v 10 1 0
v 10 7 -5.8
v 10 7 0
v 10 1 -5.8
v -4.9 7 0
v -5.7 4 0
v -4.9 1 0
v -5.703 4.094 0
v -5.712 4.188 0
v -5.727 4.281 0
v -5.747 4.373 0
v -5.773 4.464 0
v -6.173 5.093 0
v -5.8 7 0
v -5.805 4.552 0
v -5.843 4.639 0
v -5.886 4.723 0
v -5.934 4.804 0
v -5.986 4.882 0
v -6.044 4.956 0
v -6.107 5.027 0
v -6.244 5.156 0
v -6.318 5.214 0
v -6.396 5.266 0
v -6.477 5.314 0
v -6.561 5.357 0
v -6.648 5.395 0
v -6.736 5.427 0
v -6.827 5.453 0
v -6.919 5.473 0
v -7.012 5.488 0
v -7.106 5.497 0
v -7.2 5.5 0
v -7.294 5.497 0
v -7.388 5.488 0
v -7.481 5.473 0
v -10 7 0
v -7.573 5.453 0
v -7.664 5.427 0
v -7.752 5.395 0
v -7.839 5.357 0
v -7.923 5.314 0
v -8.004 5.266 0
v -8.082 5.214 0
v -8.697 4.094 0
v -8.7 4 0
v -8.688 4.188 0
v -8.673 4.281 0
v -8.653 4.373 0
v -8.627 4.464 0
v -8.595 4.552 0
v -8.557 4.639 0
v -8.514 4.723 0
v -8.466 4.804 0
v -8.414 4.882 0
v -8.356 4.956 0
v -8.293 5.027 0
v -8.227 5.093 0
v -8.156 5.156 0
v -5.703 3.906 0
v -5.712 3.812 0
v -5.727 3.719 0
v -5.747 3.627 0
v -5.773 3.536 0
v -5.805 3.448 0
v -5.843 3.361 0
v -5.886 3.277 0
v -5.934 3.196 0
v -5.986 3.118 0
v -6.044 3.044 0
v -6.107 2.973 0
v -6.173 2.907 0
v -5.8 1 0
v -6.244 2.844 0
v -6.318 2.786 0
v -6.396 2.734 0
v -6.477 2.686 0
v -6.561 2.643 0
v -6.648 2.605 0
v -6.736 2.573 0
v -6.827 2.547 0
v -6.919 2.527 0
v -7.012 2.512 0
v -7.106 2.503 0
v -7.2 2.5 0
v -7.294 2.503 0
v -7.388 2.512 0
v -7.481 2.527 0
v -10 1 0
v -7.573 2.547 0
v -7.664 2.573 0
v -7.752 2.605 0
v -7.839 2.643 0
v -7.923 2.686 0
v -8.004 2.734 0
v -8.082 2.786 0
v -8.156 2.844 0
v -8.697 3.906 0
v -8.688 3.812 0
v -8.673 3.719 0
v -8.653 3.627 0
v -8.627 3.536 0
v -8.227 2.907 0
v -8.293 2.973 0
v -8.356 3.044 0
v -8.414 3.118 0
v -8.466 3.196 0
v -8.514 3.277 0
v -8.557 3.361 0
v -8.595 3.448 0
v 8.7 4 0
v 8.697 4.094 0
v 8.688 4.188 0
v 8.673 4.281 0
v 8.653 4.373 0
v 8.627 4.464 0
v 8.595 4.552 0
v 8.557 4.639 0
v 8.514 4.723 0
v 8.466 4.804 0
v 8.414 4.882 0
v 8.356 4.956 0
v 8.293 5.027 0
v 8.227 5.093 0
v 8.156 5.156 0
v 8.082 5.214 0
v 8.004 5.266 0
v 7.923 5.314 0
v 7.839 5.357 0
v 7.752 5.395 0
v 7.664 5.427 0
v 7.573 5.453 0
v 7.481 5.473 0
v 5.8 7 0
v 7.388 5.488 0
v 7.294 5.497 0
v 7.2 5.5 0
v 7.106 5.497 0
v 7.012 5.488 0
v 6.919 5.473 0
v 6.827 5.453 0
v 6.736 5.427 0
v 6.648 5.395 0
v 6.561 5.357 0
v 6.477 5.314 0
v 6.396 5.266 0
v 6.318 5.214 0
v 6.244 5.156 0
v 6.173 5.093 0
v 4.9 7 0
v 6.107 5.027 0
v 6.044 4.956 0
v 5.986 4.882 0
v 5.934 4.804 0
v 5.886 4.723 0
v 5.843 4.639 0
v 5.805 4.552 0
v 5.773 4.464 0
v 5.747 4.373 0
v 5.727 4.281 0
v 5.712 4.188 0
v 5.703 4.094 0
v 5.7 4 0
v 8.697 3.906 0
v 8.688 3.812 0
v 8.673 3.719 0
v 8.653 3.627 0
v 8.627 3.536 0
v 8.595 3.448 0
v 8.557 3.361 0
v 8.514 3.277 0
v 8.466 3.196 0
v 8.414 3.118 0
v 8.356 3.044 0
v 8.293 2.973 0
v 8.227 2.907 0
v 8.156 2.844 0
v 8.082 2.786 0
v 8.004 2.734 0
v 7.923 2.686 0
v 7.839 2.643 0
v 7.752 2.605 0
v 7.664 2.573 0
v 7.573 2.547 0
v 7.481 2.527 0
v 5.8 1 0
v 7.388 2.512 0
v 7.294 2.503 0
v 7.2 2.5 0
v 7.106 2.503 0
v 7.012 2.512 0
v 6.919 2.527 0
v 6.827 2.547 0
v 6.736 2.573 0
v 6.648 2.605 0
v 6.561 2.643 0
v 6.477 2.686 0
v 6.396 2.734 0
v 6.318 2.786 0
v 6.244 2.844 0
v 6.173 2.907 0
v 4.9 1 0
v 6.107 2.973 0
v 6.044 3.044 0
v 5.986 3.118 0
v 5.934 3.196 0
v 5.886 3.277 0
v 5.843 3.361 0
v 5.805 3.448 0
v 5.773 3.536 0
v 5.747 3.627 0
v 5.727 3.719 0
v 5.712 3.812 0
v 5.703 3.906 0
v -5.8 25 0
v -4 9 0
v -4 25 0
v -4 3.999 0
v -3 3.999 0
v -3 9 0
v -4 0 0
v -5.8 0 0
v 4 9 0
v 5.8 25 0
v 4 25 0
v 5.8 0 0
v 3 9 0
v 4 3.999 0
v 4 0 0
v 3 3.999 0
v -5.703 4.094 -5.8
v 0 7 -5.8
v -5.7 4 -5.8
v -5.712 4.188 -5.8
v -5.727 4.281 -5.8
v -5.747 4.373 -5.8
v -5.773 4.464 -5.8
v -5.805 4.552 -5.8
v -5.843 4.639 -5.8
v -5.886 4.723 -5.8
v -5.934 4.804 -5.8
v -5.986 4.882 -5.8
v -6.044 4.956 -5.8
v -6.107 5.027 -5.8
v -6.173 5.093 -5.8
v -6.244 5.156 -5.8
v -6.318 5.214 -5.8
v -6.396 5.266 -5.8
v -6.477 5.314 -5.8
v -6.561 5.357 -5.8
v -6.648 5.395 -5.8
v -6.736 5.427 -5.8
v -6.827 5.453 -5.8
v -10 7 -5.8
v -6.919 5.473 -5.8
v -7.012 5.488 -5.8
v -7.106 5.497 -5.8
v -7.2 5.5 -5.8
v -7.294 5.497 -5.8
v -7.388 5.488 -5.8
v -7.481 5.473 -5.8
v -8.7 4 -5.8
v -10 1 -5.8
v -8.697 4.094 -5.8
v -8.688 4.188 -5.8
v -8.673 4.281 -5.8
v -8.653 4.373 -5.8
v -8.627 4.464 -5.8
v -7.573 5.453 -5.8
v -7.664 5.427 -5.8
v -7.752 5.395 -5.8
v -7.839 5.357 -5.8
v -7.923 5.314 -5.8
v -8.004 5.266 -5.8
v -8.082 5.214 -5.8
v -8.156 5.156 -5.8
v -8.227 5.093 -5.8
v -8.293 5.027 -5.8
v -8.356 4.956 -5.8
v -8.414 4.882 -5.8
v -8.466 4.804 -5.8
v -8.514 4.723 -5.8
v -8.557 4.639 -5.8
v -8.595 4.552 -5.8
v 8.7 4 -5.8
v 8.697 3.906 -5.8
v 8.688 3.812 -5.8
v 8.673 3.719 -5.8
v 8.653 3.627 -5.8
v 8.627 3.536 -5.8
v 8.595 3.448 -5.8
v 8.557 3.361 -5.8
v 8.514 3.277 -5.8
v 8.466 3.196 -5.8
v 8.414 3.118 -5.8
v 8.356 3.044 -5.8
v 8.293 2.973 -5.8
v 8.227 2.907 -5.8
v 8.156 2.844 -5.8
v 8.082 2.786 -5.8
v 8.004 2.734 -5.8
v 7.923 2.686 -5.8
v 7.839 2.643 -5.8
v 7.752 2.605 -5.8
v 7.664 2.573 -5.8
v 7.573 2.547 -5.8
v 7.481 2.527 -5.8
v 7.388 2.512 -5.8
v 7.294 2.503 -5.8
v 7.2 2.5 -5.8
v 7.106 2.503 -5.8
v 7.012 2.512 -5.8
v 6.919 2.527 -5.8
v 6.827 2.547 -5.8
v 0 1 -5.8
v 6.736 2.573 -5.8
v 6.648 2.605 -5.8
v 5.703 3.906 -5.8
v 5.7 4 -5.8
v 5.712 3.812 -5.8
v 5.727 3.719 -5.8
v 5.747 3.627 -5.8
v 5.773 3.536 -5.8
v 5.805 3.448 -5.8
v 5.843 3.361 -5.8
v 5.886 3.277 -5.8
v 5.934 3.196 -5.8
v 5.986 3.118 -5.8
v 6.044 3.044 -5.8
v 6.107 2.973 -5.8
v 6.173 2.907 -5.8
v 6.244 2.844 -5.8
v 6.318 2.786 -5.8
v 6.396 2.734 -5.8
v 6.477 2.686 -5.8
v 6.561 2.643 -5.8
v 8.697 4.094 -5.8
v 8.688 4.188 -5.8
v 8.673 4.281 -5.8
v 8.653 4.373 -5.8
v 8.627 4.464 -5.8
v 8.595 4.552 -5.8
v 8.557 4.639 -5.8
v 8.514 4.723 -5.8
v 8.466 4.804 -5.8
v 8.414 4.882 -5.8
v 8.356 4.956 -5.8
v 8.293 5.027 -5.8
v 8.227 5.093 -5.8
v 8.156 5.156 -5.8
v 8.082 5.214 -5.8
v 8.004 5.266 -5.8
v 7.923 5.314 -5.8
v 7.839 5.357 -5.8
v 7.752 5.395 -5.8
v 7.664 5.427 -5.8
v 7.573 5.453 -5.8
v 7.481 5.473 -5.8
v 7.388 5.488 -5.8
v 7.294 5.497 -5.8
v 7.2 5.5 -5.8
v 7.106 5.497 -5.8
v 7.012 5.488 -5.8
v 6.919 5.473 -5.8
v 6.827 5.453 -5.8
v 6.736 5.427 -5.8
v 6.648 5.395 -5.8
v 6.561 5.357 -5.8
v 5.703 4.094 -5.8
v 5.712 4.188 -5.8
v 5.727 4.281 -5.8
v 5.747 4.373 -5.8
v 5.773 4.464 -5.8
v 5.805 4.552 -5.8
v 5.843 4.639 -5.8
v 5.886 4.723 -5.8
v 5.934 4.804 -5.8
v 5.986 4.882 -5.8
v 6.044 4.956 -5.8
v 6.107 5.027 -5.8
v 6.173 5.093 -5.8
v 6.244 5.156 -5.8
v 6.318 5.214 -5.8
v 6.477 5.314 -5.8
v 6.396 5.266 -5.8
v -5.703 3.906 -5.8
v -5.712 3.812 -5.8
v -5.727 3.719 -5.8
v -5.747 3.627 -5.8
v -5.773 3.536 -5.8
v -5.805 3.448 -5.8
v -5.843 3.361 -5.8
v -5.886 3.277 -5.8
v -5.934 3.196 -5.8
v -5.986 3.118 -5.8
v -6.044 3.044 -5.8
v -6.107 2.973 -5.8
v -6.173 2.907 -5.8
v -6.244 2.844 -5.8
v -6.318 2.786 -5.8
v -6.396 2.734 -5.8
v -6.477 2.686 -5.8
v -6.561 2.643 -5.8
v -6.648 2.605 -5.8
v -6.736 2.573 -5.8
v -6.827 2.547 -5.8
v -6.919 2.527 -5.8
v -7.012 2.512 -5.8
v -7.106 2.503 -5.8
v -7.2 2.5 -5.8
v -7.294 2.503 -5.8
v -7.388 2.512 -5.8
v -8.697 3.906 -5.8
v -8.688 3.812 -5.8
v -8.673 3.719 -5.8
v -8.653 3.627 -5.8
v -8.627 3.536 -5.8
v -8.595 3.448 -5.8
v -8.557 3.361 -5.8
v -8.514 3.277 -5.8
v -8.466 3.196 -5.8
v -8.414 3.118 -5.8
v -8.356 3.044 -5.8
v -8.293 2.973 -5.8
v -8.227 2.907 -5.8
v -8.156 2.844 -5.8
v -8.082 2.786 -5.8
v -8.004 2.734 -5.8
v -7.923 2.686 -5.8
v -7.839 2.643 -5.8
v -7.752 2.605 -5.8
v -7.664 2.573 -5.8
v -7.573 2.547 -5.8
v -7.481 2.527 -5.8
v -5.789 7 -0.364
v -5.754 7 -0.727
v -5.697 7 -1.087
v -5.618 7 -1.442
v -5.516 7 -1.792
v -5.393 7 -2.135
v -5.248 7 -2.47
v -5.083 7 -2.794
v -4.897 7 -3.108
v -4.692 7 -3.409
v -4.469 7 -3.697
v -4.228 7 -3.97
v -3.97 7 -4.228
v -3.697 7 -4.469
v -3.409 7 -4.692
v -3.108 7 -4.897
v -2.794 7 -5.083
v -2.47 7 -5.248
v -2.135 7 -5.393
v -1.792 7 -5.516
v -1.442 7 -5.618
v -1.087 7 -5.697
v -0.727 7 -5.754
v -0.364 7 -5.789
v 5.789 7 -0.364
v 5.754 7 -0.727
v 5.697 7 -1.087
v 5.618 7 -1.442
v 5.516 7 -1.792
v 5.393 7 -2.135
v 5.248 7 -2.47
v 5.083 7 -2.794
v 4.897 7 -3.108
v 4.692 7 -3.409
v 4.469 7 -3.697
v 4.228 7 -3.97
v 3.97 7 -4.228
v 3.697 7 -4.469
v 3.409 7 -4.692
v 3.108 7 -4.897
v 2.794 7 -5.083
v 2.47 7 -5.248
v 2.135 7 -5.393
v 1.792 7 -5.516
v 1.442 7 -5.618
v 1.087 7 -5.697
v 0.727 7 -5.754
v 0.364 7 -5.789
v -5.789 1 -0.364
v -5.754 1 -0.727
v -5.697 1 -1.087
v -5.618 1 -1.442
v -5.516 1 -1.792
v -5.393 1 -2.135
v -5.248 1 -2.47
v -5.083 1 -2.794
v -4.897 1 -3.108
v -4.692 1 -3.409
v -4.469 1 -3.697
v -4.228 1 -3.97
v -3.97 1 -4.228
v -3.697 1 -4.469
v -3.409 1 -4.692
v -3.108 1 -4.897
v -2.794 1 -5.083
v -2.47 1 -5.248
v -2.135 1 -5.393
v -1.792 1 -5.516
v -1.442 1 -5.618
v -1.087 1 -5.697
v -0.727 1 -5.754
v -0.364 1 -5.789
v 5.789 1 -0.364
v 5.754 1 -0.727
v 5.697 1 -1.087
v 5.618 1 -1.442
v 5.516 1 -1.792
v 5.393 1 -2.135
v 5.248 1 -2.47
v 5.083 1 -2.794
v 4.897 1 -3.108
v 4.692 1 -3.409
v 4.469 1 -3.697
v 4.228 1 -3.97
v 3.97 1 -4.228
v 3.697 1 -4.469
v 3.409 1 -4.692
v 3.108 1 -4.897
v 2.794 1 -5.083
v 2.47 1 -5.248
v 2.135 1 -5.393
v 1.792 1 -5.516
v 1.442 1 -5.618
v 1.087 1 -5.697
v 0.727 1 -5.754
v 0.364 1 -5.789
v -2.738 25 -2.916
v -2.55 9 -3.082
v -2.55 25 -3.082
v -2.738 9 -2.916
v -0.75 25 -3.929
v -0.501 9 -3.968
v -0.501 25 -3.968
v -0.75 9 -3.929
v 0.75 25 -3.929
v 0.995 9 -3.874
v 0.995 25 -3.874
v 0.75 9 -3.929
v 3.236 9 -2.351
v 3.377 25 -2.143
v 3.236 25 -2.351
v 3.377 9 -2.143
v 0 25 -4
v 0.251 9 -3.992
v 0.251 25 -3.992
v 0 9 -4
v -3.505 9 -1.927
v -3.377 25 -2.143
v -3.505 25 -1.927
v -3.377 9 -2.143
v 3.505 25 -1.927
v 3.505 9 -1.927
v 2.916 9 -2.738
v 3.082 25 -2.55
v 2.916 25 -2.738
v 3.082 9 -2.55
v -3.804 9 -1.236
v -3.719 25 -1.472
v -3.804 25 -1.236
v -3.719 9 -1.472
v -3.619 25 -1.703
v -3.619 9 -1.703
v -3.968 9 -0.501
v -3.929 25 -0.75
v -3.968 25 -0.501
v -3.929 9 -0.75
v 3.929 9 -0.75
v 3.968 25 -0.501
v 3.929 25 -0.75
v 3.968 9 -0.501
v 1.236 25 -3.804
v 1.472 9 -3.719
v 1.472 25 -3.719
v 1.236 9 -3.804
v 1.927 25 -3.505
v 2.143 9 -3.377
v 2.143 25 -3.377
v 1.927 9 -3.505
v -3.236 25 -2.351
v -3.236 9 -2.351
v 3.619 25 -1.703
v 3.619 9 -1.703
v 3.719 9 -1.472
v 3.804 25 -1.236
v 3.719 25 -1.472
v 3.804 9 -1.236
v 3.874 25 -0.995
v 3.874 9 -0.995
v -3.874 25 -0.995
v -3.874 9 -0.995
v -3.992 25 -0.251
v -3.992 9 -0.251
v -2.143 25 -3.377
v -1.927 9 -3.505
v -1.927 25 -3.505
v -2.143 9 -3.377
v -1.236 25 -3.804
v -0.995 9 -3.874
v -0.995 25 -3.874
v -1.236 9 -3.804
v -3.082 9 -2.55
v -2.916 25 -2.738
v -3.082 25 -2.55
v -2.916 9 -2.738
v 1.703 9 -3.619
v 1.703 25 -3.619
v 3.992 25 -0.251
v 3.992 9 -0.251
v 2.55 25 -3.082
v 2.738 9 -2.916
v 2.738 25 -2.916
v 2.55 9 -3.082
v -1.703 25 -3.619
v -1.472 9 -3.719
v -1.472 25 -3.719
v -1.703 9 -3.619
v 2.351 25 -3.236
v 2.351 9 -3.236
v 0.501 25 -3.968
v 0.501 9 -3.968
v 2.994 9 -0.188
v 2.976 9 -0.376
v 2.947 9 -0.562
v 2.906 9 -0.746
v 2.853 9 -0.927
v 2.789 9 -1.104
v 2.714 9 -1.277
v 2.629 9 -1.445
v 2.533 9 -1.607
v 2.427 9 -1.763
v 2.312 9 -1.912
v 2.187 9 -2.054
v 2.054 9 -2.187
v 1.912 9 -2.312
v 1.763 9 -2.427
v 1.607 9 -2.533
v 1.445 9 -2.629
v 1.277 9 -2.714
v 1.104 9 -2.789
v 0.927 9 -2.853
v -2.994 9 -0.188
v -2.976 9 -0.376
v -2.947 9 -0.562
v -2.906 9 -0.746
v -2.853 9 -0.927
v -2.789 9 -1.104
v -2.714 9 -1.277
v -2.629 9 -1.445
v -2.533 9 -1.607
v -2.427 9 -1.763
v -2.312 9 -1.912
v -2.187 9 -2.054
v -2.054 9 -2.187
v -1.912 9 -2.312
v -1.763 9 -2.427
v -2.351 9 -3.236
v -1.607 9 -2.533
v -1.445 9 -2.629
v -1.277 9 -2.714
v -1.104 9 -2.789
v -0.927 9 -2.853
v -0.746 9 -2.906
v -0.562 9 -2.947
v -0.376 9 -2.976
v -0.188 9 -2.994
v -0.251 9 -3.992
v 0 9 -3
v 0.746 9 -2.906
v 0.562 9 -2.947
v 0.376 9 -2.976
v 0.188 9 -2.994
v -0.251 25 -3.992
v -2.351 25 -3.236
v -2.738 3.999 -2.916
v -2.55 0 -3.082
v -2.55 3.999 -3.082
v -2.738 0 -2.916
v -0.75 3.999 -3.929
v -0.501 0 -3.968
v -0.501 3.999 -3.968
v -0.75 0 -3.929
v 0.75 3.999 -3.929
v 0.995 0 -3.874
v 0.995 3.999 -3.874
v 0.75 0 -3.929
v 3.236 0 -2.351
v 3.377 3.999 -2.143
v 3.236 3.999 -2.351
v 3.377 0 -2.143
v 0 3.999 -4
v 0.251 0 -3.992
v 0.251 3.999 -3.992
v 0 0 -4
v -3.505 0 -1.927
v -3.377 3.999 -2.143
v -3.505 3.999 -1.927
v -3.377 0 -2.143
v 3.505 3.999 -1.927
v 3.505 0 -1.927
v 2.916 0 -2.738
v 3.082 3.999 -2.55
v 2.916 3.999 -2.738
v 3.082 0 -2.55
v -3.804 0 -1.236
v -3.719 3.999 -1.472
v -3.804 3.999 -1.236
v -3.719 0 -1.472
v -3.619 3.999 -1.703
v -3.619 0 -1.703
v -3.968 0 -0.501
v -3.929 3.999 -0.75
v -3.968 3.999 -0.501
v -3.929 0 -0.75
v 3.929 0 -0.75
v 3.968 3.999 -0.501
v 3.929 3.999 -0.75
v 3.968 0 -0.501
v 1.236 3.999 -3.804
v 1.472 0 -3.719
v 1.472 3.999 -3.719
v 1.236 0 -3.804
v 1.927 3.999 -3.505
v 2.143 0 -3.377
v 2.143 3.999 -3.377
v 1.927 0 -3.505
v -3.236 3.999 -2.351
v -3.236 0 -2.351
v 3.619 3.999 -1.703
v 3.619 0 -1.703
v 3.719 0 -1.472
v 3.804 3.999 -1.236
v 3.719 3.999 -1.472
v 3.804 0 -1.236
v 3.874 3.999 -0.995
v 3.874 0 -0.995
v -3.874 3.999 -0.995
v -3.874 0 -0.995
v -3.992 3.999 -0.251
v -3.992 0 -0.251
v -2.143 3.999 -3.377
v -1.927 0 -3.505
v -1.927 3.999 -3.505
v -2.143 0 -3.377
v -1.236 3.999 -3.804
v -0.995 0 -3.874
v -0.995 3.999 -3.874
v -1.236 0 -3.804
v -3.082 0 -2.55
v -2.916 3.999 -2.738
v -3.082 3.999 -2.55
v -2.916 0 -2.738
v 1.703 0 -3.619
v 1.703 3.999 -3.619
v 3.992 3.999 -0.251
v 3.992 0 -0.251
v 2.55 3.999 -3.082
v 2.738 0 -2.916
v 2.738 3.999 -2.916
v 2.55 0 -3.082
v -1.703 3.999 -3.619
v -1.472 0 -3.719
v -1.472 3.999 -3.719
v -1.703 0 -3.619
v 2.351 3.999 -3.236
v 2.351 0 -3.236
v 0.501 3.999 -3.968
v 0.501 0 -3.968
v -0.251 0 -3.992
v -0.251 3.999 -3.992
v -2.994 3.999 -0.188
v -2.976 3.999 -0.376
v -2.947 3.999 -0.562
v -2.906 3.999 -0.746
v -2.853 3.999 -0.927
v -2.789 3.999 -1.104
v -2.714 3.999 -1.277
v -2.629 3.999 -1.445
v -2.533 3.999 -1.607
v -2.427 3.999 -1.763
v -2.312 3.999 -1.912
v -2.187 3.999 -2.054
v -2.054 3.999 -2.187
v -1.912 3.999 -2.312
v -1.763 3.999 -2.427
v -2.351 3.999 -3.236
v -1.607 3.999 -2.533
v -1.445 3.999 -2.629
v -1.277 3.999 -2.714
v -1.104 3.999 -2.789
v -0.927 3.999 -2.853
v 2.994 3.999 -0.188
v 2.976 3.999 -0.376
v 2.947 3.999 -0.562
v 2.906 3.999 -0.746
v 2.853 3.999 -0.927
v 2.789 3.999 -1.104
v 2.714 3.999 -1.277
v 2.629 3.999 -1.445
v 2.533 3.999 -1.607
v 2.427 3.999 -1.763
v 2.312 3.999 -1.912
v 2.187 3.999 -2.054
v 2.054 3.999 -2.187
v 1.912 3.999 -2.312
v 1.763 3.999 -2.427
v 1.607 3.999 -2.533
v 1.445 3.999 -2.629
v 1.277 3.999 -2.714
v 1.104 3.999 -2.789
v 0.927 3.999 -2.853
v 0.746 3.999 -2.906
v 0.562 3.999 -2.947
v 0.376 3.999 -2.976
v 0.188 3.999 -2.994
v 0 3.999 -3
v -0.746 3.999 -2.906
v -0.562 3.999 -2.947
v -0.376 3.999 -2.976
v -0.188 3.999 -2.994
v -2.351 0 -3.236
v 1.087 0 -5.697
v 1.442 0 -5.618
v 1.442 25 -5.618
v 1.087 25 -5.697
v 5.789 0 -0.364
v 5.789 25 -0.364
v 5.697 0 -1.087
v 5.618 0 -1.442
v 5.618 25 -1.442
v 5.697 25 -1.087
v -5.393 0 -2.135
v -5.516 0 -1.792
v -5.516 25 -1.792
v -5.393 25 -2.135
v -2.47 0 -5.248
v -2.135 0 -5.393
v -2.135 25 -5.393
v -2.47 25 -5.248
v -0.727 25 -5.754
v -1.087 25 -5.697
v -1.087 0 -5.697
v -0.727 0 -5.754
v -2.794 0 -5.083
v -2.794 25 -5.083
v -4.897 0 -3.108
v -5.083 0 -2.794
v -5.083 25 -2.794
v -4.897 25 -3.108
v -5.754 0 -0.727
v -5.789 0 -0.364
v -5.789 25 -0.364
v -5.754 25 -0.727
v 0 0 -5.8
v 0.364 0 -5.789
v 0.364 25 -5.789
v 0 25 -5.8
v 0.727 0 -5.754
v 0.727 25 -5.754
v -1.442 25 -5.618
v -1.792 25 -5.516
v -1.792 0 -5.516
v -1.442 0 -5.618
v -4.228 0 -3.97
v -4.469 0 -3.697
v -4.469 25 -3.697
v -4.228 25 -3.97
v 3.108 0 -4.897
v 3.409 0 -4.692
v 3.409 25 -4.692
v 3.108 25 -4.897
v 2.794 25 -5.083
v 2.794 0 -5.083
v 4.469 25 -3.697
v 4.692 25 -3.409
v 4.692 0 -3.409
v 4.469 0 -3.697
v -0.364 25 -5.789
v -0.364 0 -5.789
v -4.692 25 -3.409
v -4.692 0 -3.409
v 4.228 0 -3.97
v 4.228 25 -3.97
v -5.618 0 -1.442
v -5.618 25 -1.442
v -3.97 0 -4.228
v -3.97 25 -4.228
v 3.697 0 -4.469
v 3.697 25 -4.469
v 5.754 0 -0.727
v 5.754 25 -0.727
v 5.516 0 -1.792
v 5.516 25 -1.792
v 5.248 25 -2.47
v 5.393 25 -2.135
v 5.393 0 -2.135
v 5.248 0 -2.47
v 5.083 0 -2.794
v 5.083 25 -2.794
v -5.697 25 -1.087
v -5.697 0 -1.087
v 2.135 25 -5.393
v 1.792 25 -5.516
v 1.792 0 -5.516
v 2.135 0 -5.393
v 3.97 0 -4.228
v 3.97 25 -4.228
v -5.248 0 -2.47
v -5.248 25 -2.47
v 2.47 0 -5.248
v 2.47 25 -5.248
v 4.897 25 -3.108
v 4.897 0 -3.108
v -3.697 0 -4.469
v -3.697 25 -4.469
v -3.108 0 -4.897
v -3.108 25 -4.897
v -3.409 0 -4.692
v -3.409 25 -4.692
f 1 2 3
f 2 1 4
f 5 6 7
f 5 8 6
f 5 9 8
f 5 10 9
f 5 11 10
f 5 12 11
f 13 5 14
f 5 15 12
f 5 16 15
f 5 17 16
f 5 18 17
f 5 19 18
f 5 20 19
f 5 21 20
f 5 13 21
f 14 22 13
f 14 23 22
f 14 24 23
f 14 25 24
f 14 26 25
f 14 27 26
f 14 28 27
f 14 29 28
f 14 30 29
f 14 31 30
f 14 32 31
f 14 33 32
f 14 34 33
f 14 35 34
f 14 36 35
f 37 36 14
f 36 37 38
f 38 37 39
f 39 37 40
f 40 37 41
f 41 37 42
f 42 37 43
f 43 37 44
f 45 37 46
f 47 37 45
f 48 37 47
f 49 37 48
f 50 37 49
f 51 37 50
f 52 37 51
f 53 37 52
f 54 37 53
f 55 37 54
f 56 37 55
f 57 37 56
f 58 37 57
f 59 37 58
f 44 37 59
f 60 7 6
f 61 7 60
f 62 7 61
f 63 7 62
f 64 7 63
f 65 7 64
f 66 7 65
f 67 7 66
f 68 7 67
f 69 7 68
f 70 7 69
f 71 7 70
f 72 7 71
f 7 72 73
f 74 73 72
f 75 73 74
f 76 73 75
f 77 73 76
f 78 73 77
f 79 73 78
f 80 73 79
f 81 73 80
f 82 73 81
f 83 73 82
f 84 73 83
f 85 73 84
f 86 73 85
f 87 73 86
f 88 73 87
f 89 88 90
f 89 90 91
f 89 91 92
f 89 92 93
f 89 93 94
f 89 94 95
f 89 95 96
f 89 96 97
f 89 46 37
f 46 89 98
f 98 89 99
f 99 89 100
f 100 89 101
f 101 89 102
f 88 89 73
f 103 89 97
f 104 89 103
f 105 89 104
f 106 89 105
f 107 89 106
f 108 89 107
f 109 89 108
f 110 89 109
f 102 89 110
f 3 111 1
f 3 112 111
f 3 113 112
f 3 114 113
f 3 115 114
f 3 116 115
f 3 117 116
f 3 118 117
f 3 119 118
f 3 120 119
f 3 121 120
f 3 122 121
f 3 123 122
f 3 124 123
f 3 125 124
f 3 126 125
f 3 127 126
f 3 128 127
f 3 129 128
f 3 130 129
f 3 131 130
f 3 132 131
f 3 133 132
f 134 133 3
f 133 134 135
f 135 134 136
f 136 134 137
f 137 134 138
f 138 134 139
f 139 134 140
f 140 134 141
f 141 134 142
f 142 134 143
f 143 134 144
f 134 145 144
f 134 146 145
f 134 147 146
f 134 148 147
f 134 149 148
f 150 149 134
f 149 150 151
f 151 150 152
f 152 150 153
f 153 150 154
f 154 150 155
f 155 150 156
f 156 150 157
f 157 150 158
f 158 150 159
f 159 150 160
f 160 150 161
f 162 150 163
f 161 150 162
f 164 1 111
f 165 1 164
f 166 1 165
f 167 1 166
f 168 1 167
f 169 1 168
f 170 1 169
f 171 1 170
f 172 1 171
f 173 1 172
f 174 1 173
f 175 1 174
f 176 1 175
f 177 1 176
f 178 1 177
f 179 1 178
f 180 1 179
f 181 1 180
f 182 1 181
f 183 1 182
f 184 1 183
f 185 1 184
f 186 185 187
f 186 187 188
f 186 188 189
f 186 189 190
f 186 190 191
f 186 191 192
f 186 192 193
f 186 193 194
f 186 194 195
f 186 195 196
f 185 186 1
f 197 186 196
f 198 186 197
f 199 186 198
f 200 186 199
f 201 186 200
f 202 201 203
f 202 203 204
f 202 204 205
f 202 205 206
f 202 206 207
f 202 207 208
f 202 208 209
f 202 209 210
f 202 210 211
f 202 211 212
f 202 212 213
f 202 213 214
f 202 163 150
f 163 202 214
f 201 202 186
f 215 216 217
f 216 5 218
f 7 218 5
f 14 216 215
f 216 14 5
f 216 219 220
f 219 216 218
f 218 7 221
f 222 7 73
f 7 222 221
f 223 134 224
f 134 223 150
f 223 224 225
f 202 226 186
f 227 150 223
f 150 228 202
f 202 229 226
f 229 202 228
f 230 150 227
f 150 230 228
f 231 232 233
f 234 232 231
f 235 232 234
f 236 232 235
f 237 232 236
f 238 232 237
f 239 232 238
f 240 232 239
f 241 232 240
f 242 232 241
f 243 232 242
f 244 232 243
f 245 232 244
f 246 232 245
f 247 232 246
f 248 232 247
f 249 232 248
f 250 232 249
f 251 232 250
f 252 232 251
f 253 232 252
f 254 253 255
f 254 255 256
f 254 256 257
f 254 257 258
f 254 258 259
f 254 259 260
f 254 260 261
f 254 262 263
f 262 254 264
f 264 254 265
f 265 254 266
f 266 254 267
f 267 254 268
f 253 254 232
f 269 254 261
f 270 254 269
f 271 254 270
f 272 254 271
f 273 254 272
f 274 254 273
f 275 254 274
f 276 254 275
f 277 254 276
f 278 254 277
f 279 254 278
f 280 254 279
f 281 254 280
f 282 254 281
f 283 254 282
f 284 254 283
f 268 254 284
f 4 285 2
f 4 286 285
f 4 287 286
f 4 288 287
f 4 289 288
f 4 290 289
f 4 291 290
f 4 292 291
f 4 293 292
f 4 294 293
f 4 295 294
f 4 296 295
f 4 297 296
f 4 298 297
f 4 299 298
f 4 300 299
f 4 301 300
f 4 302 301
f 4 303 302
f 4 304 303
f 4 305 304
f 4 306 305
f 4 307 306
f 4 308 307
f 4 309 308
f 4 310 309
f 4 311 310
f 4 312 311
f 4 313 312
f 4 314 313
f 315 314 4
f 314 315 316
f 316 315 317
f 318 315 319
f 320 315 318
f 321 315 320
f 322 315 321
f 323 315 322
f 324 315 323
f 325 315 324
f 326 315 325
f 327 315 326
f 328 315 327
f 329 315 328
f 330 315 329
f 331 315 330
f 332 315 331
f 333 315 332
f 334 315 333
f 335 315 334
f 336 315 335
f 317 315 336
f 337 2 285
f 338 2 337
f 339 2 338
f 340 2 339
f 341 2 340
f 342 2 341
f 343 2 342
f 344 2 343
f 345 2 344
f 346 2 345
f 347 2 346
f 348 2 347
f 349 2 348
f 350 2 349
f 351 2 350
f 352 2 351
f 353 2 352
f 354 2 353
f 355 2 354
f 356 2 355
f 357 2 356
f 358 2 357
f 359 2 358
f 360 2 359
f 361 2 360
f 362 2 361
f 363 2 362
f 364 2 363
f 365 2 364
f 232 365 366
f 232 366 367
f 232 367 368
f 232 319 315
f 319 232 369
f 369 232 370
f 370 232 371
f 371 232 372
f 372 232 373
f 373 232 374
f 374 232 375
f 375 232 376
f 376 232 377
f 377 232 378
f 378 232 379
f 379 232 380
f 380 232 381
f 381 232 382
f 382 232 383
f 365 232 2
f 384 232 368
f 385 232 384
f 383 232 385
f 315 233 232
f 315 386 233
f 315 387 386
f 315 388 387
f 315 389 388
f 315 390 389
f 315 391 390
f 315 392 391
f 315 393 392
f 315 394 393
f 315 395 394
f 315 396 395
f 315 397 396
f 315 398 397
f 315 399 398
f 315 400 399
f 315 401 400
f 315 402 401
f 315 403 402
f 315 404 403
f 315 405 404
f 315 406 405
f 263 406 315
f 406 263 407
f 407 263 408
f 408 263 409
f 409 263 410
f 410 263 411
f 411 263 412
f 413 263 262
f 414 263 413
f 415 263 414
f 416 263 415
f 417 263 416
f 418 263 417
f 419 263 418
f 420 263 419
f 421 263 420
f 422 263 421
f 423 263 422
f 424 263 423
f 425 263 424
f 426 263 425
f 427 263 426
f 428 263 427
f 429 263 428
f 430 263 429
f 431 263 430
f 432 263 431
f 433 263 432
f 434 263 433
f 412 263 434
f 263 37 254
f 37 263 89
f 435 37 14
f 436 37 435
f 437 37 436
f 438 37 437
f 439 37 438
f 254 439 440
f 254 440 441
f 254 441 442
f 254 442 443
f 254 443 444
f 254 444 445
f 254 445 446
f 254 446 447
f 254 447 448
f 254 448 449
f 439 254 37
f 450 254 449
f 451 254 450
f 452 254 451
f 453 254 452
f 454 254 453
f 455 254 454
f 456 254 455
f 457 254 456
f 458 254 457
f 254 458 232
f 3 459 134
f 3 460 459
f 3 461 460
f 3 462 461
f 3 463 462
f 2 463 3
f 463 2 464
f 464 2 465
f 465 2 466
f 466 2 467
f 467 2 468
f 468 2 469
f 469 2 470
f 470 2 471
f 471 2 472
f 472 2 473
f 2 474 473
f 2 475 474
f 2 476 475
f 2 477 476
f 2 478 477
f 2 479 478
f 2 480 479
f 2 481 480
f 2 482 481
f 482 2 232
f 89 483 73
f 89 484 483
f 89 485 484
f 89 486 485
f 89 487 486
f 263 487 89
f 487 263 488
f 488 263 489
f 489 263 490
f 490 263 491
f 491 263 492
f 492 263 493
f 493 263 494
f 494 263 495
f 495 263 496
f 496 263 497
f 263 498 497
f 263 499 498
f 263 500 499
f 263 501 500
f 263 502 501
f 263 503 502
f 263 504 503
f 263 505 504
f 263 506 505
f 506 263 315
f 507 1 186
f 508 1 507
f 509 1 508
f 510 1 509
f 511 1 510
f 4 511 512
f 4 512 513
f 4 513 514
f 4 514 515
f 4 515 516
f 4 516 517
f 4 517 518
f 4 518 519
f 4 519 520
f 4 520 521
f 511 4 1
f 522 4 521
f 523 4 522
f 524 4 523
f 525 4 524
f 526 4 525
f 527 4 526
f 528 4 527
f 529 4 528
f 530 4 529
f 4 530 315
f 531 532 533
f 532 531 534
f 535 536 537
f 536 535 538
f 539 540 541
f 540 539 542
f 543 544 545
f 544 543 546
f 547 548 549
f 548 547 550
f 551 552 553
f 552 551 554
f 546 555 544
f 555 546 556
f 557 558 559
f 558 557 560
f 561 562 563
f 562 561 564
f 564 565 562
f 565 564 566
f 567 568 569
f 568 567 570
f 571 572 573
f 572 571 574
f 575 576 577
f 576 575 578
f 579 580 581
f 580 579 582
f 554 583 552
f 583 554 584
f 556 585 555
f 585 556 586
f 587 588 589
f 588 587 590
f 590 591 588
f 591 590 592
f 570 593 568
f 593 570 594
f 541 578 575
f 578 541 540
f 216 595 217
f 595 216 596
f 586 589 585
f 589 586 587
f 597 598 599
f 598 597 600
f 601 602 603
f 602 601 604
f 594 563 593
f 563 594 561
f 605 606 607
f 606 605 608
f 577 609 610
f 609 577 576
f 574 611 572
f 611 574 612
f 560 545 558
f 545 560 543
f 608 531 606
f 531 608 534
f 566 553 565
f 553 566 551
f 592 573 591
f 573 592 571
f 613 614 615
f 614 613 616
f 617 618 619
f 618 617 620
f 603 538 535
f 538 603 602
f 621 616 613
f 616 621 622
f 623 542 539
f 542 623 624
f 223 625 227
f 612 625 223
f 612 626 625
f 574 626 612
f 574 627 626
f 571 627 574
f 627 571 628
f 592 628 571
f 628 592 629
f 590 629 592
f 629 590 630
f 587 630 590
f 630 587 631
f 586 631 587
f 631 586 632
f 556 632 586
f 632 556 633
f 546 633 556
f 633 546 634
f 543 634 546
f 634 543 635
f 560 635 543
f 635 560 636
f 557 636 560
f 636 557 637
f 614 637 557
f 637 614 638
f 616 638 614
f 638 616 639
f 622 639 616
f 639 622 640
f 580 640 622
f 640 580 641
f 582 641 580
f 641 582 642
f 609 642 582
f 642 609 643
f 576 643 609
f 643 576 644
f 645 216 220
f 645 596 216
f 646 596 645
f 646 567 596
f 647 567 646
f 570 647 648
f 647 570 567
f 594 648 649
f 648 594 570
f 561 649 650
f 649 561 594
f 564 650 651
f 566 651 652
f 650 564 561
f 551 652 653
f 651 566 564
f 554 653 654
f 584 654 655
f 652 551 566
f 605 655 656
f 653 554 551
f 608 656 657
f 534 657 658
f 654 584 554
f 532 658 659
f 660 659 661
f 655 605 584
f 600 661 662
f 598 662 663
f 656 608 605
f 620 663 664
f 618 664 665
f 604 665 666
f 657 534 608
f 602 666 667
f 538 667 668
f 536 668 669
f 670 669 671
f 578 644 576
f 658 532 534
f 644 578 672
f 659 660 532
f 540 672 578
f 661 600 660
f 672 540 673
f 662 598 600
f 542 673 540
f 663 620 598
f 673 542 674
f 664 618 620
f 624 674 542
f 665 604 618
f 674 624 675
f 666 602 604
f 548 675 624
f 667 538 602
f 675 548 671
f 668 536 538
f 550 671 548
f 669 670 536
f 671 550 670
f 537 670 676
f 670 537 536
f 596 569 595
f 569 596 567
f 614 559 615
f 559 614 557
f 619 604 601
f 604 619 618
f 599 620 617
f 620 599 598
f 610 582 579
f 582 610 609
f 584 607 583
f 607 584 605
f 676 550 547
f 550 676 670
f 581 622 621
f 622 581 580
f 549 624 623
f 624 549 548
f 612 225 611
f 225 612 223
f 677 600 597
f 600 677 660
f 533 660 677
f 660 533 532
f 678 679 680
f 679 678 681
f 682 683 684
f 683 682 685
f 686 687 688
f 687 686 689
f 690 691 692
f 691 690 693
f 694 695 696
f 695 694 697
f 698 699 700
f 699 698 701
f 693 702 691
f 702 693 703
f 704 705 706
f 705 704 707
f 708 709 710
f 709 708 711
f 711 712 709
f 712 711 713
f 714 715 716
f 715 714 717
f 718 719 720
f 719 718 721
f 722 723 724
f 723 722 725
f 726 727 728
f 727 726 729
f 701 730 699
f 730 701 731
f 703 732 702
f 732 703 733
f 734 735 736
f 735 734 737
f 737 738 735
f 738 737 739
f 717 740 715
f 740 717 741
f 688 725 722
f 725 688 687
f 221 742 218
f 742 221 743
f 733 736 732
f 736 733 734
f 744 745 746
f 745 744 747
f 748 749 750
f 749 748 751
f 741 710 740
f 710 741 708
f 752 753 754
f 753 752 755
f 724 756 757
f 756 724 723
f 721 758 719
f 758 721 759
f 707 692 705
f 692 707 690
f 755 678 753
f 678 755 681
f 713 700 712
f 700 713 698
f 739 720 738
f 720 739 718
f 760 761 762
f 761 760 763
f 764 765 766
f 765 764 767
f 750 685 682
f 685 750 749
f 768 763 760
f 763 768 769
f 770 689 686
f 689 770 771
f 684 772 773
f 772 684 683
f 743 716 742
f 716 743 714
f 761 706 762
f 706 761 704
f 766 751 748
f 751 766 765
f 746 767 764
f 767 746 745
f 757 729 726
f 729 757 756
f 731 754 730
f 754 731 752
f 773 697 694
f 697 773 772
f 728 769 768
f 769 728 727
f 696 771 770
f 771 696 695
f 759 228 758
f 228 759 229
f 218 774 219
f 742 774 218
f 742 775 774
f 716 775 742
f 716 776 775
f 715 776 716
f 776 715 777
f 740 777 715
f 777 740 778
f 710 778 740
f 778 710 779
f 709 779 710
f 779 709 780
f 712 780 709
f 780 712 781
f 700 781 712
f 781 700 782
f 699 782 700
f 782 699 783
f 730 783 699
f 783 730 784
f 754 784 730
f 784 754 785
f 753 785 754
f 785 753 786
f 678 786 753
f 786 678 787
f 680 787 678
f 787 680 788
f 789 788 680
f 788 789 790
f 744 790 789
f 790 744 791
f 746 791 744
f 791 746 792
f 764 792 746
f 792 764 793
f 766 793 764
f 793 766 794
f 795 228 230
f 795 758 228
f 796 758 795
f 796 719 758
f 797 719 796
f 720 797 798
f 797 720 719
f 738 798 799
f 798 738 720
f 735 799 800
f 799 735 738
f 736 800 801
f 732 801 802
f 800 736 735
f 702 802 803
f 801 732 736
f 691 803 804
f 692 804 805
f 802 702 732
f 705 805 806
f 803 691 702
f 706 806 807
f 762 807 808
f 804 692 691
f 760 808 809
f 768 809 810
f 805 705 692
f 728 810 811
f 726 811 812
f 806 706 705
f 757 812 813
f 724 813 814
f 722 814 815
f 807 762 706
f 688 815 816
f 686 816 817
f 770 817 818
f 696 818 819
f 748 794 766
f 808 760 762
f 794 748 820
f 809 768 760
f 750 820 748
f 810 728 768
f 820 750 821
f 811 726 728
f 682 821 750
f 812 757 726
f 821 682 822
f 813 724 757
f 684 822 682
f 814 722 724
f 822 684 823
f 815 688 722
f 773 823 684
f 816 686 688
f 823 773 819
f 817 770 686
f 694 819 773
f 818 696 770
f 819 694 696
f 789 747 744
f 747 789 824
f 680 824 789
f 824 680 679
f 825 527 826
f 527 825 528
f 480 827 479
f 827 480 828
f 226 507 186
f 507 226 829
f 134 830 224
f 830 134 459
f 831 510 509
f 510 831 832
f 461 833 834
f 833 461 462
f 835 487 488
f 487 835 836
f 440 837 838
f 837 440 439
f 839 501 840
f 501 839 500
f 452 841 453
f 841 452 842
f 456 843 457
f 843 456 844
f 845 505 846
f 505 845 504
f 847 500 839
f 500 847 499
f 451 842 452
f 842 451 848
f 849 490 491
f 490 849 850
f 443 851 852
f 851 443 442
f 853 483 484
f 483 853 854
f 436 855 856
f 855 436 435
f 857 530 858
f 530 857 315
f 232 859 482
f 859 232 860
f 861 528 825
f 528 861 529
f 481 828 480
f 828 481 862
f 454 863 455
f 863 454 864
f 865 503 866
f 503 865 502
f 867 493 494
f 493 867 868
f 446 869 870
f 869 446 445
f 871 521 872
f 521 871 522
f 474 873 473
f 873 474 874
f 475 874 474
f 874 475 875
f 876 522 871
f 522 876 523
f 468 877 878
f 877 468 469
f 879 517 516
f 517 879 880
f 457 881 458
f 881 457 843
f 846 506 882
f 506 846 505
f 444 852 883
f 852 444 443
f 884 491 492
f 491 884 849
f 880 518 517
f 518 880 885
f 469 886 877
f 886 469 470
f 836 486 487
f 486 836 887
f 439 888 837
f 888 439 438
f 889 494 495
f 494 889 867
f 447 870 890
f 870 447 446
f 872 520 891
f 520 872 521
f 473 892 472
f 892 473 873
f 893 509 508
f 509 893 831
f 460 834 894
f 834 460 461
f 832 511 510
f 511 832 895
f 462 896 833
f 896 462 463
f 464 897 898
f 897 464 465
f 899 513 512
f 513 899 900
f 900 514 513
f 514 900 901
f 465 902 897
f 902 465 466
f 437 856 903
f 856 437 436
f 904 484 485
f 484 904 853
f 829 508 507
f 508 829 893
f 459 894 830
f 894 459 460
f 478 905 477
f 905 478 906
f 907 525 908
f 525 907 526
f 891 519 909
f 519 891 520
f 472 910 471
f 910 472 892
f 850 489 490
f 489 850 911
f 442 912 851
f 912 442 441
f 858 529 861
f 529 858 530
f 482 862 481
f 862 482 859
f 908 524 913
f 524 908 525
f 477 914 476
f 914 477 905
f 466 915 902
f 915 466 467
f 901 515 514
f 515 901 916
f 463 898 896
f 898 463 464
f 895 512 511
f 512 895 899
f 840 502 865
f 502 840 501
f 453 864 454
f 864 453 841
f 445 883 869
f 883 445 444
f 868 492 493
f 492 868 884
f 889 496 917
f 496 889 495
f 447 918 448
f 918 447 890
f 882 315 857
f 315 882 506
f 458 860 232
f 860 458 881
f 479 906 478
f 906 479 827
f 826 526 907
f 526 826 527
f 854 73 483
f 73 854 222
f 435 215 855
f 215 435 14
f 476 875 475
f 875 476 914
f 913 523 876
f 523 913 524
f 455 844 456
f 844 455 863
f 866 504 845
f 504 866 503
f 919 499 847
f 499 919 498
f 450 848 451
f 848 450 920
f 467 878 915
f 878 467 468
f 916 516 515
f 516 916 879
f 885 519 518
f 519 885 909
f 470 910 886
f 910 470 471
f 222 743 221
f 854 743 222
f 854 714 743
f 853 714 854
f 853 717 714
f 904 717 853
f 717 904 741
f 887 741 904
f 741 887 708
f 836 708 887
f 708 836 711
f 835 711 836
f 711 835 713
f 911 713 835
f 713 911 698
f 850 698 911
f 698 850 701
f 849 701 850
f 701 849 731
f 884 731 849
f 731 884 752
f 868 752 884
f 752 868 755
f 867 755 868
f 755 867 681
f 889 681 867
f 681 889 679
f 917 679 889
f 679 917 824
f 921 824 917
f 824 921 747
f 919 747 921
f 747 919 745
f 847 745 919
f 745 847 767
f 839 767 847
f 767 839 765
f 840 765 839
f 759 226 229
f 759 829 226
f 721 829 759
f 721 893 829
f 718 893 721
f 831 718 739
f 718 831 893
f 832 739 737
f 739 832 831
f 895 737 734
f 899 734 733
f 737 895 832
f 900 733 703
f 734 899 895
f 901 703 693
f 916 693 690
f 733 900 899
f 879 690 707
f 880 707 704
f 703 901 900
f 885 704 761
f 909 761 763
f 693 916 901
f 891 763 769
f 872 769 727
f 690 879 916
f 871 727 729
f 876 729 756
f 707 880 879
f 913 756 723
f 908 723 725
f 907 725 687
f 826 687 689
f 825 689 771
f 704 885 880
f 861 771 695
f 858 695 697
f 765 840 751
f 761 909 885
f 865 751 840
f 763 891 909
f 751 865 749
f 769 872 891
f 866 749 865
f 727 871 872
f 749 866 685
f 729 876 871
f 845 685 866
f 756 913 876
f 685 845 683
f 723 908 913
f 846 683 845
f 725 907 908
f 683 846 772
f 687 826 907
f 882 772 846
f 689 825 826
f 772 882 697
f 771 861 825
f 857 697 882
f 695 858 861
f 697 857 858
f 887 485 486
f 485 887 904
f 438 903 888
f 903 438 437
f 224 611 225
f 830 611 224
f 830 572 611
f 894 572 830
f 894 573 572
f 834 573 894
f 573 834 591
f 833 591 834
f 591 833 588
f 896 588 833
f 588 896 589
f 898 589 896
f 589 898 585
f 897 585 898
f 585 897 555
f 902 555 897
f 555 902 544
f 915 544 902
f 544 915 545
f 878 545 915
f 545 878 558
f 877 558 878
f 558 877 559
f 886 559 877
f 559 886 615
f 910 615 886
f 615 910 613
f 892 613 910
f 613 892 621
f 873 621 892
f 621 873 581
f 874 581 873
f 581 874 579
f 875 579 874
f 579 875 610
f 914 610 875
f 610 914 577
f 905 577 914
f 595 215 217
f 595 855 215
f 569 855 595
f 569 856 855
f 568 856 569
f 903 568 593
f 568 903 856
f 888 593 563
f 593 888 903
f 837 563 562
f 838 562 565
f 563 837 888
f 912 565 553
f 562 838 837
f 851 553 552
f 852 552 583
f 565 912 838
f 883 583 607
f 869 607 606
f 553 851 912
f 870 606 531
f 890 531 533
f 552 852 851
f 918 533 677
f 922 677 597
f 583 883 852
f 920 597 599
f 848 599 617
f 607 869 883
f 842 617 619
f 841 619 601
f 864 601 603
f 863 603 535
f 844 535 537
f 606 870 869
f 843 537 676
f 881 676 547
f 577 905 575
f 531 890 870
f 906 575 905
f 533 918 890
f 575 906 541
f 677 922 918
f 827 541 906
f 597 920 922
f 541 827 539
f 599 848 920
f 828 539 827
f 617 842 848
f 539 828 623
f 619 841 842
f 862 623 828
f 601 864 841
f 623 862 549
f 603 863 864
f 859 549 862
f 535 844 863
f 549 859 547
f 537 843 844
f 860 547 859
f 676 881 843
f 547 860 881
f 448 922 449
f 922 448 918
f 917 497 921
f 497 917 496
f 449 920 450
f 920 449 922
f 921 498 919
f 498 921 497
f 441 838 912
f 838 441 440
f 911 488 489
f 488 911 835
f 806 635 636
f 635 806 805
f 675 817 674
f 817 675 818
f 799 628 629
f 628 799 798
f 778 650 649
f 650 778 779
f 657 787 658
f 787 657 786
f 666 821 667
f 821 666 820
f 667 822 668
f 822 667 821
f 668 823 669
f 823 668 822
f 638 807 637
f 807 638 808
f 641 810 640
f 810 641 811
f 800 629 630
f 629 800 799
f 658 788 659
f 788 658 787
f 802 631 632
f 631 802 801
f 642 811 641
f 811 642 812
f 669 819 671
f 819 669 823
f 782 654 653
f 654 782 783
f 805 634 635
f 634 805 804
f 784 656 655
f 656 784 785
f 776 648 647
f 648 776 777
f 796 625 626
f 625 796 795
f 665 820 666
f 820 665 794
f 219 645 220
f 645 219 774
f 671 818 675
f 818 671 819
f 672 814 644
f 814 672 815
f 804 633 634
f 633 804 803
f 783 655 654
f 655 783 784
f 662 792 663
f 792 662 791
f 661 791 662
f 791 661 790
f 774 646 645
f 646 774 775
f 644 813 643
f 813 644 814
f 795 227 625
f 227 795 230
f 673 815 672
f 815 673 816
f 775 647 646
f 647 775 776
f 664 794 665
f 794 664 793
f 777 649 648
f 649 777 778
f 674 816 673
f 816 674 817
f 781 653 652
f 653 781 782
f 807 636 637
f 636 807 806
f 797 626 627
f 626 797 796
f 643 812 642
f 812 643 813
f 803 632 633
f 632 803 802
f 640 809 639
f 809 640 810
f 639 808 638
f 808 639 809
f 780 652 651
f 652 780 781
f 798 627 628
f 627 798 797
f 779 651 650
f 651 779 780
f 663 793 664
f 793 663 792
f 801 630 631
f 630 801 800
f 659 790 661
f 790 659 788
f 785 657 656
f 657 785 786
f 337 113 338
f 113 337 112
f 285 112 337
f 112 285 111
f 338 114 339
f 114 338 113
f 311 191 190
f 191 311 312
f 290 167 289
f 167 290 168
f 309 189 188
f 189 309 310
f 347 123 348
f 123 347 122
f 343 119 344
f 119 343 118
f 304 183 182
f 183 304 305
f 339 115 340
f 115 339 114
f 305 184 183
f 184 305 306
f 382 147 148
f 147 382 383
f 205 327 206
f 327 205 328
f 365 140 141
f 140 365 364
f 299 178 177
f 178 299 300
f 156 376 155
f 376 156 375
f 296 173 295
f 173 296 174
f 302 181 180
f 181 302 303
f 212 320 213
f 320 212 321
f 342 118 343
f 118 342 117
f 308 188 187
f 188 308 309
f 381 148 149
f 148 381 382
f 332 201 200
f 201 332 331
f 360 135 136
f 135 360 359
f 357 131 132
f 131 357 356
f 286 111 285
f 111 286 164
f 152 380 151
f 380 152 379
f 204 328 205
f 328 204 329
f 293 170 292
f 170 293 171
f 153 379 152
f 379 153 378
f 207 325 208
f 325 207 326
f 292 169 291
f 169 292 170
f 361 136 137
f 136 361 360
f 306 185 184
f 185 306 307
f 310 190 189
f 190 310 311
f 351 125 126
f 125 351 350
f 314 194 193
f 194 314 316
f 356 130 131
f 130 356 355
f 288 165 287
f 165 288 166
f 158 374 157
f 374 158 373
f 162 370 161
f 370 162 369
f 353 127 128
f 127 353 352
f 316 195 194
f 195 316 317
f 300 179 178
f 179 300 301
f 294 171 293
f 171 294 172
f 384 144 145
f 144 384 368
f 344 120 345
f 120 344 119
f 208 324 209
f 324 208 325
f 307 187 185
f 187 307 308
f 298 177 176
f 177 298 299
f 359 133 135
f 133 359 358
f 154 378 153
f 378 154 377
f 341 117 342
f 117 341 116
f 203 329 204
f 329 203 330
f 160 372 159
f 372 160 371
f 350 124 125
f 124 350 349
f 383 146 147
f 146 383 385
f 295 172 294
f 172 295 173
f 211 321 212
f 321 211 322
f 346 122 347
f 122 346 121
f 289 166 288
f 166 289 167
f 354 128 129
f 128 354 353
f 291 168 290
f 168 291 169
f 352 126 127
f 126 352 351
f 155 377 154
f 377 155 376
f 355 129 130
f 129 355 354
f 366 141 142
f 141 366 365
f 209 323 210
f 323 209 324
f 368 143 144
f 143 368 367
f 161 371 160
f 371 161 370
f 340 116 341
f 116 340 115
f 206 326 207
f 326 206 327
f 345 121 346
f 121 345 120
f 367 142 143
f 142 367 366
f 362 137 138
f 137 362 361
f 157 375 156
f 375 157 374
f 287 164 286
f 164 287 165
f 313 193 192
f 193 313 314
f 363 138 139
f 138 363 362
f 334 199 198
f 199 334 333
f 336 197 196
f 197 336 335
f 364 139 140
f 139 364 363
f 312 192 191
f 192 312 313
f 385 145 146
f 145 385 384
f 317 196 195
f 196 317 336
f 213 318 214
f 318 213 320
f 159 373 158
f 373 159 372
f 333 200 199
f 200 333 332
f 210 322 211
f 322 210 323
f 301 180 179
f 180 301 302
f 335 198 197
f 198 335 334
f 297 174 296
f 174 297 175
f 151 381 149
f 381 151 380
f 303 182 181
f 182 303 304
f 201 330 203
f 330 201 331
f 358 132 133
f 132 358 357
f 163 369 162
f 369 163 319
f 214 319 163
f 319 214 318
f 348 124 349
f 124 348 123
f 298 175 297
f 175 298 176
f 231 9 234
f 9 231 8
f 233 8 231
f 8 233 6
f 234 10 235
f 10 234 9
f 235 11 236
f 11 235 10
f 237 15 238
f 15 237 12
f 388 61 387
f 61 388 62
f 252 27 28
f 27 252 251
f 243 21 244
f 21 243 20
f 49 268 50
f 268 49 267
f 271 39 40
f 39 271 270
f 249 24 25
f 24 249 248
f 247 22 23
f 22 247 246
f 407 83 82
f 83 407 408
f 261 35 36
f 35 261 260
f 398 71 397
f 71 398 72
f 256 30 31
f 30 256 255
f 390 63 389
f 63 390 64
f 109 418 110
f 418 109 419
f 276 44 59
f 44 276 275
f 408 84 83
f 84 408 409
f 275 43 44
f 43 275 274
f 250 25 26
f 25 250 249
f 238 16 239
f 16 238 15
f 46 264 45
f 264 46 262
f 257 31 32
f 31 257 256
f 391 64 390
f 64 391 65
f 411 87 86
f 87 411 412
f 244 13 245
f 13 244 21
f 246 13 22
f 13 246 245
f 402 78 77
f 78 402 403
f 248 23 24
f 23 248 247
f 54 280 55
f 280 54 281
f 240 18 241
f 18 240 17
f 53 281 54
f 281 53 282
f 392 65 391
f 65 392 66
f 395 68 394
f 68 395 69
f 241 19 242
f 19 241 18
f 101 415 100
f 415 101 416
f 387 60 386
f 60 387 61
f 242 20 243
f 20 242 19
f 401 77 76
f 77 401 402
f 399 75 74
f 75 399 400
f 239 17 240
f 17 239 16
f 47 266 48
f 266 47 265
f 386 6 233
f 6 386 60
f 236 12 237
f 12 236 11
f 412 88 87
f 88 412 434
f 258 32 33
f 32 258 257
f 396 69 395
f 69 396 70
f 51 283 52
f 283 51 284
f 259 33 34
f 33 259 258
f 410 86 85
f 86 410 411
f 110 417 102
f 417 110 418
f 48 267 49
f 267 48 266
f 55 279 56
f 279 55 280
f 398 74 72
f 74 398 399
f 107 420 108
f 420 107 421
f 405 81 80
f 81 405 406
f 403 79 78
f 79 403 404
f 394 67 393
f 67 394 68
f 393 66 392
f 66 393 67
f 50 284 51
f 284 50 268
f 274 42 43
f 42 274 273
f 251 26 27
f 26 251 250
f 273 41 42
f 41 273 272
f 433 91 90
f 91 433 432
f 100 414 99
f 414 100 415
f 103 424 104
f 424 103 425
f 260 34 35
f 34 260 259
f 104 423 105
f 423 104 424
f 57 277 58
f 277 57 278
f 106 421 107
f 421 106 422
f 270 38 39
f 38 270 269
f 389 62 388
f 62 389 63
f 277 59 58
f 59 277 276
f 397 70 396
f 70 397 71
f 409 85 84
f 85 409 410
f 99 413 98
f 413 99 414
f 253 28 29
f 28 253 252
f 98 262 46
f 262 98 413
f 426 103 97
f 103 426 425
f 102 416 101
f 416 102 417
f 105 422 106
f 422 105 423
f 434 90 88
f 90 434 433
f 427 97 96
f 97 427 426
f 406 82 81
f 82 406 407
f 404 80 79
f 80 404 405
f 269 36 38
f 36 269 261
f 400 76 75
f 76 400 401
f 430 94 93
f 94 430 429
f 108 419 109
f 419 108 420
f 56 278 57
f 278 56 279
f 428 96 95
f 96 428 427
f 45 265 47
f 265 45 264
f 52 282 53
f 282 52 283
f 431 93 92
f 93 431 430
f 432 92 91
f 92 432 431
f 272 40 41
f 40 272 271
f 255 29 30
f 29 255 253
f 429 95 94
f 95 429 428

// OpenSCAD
$fn=100;

Daxis=8;//diametre axe
Dmin=6;//diametre dans l'encoche

Lroulement_encoche=16;//distance minimale entre le roulement et l'encoche
Lroulement_roue=18;//distance entre la fin du roulement et la partie exterieure de la poulie
Lencoche=5;//longueur de l'encoche

ep=1.8;//epaisseur du manchon

Dholes=3;//diametre des trous de fixation
Dflat=Dholes*2;//longueur plate a cote des trous

Lsq=25;//longueur de la piece

Wsq=18;

eps=0.001;

cutx=Wsq*2;
cuty=Lsq*4;
cutz=Daxis*2;

difference()//holes for screews
{

union(){//place for screews

translate([0,Lsq-Dflat-Lroulement_roue,0])
difference(){
translate([0,Dflat/2,-Daxis/4-ep/2])
cube(size=[Daxis*2.5,Dflat,Daxis/2+ep],center=true);

translate([0,Lsq/2-eps,0])
rotate([90,0,0])
cylinder(h=Lsq,r=Daxis/2+ep/2,center=true);
}

difference(){//cuts the cilinder in 2
    
difference(){//central hole

difference(){//cut 2 sections
translate([0,Lsq/2,0])
rotate([90,0,0])
cylinder(h=Lsq,r=Daxis/2+ep,center=true);

union(){//2 cut sections in tube
translate([0,Lroulement_encoche/2+(Lsq-Lroulement_encoche)+eps,0])
rotate([90,0,0])
cylinder(h=Lroulement_encoche+eps,r=Daxis/2,center=true);
    
tmp=Lsq-Lroulement_encoche-Lencoche;
translate([0,tmp/2-eps,0])
rotate([90,0,0])
cylinder(h=tmp,r=Daxis/2,center=true);
}
}

rotate([90,0,0])
cylinder(h=Lsq*4,r=Dmin/2,center=true);
}

translate([0,0,cutz/2])
cube(size=[cutx,cuty,cutz],center=true);
}
}

translate([0,Lsq-Dflat-Lroulement_roue,0])
union(){
translate([Daxis*0.9,Dflat/2,0])
cylinder(h=Lsq,r=Dholes/2,center=true);

translate([-Daxis*0.9,Dflat/2,0])
cylinder(h=Lsq,r=Dholes/2,center=true);
}

}
